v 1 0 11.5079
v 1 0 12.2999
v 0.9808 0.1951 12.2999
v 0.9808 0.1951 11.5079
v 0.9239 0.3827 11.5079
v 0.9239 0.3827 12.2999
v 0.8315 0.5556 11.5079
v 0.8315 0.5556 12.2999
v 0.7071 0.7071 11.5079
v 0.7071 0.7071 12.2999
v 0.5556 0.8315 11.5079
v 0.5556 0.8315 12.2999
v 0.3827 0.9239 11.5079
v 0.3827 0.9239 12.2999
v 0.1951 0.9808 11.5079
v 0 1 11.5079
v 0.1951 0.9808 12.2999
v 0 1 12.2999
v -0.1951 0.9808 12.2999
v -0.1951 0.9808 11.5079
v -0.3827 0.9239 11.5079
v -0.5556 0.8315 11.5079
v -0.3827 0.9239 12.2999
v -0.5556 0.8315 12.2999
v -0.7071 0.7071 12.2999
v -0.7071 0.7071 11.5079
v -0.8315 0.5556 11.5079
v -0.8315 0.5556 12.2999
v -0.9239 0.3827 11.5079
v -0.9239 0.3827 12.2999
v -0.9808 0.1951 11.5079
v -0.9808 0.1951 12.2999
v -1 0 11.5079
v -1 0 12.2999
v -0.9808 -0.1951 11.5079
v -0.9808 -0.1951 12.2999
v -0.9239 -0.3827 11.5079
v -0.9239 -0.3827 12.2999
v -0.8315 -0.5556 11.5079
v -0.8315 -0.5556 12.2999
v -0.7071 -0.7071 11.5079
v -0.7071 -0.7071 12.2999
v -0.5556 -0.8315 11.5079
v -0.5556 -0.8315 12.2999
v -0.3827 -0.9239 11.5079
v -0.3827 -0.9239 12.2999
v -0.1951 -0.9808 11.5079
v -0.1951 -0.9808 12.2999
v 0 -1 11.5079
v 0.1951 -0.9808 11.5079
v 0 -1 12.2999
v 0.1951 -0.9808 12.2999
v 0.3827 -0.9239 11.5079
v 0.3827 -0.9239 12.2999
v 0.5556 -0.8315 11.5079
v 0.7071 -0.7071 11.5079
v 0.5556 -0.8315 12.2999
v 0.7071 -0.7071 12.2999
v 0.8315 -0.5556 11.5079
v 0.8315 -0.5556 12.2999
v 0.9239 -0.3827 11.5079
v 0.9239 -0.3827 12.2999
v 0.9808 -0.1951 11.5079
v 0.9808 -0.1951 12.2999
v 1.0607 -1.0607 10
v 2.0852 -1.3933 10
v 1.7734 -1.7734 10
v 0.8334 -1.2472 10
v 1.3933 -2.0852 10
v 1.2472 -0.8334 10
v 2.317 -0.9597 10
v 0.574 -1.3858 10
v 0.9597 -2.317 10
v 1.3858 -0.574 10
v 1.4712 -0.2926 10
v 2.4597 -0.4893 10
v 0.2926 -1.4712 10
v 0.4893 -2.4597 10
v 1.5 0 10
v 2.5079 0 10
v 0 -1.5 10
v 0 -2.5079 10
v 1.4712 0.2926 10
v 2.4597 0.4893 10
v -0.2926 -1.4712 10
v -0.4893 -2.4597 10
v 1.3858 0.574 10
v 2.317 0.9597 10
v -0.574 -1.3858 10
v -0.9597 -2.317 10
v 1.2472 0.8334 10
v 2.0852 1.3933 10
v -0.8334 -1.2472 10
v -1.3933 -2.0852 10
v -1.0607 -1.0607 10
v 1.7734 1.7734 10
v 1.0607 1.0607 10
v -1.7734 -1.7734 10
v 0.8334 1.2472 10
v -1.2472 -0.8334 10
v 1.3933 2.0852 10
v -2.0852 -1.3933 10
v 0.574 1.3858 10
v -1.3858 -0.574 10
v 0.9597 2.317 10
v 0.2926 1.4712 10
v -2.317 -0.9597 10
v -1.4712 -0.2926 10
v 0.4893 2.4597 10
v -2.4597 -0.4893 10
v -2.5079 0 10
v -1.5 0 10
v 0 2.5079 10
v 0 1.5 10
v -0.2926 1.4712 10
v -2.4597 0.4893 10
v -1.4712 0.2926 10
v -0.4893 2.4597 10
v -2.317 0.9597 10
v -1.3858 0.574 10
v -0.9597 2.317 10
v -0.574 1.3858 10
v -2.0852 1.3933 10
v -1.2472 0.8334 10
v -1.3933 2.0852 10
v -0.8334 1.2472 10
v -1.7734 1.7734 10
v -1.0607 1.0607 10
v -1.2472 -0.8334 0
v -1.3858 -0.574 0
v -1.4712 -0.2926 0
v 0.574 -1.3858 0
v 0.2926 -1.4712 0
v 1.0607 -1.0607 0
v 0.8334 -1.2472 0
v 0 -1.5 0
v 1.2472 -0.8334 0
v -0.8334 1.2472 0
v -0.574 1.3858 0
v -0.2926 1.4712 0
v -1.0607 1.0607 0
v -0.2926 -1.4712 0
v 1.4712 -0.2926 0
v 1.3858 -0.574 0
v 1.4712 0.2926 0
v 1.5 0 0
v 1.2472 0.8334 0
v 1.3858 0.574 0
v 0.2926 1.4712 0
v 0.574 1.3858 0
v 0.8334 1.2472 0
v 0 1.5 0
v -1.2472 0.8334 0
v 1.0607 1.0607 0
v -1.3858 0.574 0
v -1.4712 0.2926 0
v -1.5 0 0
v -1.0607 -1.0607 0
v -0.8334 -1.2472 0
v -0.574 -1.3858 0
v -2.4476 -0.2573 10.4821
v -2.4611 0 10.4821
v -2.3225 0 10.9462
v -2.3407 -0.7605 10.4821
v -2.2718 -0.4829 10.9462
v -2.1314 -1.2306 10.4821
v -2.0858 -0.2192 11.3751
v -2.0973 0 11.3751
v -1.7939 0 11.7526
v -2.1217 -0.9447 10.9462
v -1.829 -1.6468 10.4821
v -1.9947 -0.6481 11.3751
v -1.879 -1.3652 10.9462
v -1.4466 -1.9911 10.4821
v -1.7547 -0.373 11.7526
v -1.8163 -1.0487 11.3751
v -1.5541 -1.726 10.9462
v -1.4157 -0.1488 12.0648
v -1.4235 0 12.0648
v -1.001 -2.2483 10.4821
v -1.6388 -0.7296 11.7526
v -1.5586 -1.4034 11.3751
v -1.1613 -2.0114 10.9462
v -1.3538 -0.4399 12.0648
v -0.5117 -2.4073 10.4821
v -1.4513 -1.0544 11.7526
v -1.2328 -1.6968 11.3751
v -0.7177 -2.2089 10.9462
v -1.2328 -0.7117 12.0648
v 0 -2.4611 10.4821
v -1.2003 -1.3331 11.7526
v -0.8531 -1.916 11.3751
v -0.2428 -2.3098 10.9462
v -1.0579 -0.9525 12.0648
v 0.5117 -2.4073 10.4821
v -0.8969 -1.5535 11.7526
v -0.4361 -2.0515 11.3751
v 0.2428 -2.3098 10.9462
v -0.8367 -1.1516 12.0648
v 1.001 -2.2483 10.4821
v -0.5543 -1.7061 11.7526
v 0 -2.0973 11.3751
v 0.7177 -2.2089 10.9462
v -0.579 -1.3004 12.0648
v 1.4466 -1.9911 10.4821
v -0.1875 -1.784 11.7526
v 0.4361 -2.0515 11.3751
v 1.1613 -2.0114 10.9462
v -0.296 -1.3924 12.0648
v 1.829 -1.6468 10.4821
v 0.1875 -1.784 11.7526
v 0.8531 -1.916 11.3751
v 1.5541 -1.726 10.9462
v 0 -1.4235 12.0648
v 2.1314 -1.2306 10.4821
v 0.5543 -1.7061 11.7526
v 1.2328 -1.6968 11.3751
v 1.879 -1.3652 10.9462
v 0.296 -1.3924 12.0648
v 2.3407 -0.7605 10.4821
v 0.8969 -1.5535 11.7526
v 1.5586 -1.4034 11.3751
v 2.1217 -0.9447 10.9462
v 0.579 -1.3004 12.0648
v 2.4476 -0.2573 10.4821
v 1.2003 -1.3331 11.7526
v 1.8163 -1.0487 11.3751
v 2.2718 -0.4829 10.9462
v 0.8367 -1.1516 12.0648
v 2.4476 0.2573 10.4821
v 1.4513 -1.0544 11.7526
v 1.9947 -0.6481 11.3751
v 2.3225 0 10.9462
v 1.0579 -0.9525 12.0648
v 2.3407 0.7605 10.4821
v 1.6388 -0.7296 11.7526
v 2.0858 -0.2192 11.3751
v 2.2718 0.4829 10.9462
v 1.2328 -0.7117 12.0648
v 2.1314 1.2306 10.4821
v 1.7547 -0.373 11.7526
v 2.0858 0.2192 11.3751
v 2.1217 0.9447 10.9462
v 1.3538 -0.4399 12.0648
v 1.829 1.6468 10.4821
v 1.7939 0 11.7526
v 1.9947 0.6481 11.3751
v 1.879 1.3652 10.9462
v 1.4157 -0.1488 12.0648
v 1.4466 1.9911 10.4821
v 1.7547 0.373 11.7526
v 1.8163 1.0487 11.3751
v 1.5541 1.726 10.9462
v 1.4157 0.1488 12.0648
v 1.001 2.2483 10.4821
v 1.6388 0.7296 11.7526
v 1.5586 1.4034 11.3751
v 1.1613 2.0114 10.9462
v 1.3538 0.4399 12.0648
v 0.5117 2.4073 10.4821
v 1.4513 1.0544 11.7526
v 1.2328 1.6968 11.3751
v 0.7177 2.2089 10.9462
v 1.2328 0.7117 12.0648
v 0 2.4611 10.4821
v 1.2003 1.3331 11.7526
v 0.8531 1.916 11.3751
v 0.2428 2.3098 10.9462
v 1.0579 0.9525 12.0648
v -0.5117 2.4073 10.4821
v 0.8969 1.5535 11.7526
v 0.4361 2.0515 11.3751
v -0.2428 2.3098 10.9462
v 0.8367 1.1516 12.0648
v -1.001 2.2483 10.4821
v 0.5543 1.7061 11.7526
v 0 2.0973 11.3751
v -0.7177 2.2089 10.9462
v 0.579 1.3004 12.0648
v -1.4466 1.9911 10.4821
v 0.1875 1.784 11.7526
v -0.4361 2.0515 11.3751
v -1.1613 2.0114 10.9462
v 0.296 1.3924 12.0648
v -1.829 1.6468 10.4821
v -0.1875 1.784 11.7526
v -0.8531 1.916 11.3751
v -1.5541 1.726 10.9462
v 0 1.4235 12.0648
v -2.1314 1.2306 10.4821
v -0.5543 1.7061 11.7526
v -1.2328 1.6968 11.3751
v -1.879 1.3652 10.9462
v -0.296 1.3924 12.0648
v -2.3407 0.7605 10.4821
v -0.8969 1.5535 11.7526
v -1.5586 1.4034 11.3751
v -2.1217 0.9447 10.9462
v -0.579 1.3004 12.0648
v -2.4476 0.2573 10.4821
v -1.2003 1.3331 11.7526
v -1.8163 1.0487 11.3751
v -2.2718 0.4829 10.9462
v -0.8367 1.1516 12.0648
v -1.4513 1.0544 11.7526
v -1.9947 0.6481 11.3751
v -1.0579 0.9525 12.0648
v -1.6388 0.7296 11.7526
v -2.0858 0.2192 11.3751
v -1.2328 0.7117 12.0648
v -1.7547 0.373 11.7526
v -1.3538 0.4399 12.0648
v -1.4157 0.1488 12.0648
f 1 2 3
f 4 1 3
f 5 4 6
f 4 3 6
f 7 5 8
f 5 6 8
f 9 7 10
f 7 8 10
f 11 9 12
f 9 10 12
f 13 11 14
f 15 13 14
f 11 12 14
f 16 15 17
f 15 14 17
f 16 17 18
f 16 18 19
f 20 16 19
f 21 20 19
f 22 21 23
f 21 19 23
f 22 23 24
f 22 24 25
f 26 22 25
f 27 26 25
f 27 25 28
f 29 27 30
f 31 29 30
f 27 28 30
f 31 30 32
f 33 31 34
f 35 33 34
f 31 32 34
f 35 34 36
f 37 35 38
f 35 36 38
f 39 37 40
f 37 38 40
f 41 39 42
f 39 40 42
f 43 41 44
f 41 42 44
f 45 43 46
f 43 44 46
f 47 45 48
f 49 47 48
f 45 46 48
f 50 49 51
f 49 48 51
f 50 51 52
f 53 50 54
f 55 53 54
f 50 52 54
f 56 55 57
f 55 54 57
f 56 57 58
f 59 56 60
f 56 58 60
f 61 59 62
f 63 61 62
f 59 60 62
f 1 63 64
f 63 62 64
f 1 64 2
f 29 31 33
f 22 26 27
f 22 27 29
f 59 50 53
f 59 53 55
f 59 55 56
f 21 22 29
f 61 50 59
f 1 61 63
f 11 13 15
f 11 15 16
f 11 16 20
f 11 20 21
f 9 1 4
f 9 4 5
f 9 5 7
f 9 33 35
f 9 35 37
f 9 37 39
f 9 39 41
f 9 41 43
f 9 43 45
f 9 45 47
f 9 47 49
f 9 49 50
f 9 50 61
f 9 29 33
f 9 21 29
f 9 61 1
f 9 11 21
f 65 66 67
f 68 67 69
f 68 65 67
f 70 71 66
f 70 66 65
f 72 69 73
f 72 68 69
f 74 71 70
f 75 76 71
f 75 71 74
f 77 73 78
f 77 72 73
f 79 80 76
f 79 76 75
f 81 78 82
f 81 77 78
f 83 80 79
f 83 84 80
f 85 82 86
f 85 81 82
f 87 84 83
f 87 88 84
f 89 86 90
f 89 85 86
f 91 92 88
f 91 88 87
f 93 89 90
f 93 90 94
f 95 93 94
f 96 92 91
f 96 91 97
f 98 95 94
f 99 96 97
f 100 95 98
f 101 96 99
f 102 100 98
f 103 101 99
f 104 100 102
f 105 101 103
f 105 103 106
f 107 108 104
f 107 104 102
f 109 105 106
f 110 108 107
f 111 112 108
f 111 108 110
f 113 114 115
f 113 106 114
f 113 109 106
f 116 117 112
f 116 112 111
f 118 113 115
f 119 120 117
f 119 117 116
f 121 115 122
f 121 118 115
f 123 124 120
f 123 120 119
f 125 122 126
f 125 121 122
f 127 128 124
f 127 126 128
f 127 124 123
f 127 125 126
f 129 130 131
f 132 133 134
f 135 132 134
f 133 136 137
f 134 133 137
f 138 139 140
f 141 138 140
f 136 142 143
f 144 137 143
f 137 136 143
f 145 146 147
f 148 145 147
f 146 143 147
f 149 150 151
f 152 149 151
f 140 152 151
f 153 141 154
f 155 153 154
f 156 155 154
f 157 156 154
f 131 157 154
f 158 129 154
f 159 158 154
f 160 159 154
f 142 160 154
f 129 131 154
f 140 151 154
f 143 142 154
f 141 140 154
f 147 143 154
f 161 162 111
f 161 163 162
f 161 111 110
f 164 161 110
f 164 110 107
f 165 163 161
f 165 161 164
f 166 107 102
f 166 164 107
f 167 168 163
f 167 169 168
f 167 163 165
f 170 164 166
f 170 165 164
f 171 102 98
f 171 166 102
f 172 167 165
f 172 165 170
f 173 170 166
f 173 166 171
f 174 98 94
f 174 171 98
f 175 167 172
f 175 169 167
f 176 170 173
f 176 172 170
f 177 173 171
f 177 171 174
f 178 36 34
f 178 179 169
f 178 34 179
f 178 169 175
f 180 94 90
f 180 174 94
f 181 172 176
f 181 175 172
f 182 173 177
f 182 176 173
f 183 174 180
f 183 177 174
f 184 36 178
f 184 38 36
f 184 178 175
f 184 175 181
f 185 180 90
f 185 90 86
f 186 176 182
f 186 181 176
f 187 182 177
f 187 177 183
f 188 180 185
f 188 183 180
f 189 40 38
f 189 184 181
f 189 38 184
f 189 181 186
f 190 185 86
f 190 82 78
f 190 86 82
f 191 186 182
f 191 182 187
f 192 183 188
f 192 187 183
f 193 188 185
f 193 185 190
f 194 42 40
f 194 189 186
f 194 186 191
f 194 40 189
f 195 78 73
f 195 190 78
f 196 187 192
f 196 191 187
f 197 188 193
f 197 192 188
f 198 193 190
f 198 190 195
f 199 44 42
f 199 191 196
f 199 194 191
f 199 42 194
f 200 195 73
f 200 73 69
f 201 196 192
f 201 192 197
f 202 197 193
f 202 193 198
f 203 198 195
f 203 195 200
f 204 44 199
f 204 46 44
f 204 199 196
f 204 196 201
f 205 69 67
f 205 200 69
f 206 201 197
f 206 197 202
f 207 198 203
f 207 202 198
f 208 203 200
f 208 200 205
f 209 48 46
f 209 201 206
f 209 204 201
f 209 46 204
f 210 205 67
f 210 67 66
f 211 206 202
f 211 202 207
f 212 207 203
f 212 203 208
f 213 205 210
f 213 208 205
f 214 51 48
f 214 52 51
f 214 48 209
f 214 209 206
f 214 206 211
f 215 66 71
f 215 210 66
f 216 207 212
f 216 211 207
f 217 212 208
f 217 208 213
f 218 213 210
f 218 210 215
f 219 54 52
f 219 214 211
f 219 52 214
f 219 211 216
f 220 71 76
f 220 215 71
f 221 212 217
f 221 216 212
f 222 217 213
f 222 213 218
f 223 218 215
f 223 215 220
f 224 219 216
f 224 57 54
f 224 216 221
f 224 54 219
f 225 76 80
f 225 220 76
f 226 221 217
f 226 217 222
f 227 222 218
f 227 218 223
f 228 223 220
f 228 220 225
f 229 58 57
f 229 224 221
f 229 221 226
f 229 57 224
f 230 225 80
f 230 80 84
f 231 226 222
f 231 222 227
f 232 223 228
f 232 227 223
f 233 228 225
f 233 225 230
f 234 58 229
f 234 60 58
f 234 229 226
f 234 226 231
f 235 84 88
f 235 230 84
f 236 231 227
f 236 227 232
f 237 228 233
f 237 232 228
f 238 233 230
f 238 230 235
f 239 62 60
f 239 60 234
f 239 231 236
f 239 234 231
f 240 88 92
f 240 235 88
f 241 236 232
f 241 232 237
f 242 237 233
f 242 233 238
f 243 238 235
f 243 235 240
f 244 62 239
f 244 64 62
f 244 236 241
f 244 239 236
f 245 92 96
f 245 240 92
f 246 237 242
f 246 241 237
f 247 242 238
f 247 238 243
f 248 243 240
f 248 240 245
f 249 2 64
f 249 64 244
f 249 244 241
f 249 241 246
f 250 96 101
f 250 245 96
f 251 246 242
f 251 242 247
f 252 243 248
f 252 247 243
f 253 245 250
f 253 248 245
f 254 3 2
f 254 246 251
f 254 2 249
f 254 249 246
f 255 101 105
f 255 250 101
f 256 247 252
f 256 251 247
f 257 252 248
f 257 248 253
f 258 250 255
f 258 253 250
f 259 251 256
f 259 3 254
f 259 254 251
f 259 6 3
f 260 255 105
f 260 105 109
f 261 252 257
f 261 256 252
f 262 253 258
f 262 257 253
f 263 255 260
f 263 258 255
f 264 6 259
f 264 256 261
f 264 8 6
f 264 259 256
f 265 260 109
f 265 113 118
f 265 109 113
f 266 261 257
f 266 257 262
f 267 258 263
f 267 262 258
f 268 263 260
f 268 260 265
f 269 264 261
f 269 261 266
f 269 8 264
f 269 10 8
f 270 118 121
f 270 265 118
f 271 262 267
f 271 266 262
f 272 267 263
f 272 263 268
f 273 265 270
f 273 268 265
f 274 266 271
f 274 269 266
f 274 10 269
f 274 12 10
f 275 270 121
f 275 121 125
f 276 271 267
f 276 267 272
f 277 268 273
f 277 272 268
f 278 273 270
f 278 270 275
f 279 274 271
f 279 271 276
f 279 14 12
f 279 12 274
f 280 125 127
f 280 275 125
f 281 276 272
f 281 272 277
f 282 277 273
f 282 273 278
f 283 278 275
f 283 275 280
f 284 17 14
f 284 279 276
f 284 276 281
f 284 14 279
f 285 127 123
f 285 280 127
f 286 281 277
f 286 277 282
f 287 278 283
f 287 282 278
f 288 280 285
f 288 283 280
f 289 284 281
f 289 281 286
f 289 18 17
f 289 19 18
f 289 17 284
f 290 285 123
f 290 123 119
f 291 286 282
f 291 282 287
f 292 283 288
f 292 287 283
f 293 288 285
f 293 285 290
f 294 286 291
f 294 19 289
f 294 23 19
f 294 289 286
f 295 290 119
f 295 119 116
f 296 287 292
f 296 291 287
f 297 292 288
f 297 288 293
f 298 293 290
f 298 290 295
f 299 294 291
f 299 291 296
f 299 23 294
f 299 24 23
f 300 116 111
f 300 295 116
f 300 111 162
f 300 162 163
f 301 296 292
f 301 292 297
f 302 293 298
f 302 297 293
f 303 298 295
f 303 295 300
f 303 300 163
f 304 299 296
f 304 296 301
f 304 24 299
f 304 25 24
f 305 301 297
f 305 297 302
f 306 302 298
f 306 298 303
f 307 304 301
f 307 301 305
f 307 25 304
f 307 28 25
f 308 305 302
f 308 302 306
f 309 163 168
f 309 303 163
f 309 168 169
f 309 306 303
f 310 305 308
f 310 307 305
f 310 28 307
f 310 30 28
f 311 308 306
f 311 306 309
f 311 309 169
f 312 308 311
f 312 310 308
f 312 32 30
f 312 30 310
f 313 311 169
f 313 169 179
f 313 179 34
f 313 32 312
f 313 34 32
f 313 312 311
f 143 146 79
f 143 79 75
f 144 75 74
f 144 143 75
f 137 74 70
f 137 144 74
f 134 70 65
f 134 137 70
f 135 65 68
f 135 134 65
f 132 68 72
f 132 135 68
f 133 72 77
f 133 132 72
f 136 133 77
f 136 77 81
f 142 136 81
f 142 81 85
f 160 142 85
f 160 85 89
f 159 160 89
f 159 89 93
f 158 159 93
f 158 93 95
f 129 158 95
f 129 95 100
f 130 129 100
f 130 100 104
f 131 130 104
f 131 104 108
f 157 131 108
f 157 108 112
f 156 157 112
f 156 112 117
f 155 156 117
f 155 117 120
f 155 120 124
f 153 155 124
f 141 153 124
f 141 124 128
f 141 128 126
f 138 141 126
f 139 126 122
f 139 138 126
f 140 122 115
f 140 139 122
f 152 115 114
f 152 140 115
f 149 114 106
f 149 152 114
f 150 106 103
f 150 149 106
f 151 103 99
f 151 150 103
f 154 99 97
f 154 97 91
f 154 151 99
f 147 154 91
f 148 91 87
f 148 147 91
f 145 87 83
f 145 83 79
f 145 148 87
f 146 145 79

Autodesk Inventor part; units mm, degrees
ref_plane "YZ Plane" through (0, 0, 0) normal (1, 0, 0) x (0, 1, 0)
ref_plane "XZ Plane" through (0, 0, 0) normal (0, 1, 0) x (-1, 0, 0)
sketch "Sketch1" plane through (0, 0, 0) normal (0, 0, 1) x (1, 0, 0)
  circle A0 centre (0, 0) radius 1.5
  dimension "d0" = 3
extrude "Extrusion1" add sketch "Sketch1" along normal blind 10
sketch "Sketch2" plane through (0, 0, 0) normal (0, 1, 0) x (-1, 0, 0)
  line L0 (1.5, 10) -> (-1.5, 10) projected
  line L1 (1.5, 0) -> (-1.5, 0) projected
  line L2 (1.5, 10) -> (-1.5, 10) projected
  line L3 (0, 12.0549) -> (0, 7.9451)
  arc A0 (2.5079, 10) -> (-2.5079, 10) centre (0, 10) ccw
  line L4 (-2.5079, 10) -> (2.5079, 10)
  line L5 (0, 10) -> (0, 12.5079)
  point P0 (0, 0)
revolve "Revolution1" add sketch "Sketch2" angle 360 about axis through (0, 0, 12.0549) along (0, 0, -1) picked at (0.5212, 11.3386) contours L0 L3 L5 A0 L4
ref_plane "Work Plane1" through (0, 0, 12.5079) normal (0, 0, 1) x (1, 0, 0)
sketch "Sketch3" plane through (0, 0, 12.5079) normal (0, 0, 1) x (1, 0, 0)
  circle A0 centre (0, 0) radius 1
  dimension "d4" = 2
extrude "Extrusion2" cut sketch "Sketch3" against normal blind 1
properties part number "Perno"
